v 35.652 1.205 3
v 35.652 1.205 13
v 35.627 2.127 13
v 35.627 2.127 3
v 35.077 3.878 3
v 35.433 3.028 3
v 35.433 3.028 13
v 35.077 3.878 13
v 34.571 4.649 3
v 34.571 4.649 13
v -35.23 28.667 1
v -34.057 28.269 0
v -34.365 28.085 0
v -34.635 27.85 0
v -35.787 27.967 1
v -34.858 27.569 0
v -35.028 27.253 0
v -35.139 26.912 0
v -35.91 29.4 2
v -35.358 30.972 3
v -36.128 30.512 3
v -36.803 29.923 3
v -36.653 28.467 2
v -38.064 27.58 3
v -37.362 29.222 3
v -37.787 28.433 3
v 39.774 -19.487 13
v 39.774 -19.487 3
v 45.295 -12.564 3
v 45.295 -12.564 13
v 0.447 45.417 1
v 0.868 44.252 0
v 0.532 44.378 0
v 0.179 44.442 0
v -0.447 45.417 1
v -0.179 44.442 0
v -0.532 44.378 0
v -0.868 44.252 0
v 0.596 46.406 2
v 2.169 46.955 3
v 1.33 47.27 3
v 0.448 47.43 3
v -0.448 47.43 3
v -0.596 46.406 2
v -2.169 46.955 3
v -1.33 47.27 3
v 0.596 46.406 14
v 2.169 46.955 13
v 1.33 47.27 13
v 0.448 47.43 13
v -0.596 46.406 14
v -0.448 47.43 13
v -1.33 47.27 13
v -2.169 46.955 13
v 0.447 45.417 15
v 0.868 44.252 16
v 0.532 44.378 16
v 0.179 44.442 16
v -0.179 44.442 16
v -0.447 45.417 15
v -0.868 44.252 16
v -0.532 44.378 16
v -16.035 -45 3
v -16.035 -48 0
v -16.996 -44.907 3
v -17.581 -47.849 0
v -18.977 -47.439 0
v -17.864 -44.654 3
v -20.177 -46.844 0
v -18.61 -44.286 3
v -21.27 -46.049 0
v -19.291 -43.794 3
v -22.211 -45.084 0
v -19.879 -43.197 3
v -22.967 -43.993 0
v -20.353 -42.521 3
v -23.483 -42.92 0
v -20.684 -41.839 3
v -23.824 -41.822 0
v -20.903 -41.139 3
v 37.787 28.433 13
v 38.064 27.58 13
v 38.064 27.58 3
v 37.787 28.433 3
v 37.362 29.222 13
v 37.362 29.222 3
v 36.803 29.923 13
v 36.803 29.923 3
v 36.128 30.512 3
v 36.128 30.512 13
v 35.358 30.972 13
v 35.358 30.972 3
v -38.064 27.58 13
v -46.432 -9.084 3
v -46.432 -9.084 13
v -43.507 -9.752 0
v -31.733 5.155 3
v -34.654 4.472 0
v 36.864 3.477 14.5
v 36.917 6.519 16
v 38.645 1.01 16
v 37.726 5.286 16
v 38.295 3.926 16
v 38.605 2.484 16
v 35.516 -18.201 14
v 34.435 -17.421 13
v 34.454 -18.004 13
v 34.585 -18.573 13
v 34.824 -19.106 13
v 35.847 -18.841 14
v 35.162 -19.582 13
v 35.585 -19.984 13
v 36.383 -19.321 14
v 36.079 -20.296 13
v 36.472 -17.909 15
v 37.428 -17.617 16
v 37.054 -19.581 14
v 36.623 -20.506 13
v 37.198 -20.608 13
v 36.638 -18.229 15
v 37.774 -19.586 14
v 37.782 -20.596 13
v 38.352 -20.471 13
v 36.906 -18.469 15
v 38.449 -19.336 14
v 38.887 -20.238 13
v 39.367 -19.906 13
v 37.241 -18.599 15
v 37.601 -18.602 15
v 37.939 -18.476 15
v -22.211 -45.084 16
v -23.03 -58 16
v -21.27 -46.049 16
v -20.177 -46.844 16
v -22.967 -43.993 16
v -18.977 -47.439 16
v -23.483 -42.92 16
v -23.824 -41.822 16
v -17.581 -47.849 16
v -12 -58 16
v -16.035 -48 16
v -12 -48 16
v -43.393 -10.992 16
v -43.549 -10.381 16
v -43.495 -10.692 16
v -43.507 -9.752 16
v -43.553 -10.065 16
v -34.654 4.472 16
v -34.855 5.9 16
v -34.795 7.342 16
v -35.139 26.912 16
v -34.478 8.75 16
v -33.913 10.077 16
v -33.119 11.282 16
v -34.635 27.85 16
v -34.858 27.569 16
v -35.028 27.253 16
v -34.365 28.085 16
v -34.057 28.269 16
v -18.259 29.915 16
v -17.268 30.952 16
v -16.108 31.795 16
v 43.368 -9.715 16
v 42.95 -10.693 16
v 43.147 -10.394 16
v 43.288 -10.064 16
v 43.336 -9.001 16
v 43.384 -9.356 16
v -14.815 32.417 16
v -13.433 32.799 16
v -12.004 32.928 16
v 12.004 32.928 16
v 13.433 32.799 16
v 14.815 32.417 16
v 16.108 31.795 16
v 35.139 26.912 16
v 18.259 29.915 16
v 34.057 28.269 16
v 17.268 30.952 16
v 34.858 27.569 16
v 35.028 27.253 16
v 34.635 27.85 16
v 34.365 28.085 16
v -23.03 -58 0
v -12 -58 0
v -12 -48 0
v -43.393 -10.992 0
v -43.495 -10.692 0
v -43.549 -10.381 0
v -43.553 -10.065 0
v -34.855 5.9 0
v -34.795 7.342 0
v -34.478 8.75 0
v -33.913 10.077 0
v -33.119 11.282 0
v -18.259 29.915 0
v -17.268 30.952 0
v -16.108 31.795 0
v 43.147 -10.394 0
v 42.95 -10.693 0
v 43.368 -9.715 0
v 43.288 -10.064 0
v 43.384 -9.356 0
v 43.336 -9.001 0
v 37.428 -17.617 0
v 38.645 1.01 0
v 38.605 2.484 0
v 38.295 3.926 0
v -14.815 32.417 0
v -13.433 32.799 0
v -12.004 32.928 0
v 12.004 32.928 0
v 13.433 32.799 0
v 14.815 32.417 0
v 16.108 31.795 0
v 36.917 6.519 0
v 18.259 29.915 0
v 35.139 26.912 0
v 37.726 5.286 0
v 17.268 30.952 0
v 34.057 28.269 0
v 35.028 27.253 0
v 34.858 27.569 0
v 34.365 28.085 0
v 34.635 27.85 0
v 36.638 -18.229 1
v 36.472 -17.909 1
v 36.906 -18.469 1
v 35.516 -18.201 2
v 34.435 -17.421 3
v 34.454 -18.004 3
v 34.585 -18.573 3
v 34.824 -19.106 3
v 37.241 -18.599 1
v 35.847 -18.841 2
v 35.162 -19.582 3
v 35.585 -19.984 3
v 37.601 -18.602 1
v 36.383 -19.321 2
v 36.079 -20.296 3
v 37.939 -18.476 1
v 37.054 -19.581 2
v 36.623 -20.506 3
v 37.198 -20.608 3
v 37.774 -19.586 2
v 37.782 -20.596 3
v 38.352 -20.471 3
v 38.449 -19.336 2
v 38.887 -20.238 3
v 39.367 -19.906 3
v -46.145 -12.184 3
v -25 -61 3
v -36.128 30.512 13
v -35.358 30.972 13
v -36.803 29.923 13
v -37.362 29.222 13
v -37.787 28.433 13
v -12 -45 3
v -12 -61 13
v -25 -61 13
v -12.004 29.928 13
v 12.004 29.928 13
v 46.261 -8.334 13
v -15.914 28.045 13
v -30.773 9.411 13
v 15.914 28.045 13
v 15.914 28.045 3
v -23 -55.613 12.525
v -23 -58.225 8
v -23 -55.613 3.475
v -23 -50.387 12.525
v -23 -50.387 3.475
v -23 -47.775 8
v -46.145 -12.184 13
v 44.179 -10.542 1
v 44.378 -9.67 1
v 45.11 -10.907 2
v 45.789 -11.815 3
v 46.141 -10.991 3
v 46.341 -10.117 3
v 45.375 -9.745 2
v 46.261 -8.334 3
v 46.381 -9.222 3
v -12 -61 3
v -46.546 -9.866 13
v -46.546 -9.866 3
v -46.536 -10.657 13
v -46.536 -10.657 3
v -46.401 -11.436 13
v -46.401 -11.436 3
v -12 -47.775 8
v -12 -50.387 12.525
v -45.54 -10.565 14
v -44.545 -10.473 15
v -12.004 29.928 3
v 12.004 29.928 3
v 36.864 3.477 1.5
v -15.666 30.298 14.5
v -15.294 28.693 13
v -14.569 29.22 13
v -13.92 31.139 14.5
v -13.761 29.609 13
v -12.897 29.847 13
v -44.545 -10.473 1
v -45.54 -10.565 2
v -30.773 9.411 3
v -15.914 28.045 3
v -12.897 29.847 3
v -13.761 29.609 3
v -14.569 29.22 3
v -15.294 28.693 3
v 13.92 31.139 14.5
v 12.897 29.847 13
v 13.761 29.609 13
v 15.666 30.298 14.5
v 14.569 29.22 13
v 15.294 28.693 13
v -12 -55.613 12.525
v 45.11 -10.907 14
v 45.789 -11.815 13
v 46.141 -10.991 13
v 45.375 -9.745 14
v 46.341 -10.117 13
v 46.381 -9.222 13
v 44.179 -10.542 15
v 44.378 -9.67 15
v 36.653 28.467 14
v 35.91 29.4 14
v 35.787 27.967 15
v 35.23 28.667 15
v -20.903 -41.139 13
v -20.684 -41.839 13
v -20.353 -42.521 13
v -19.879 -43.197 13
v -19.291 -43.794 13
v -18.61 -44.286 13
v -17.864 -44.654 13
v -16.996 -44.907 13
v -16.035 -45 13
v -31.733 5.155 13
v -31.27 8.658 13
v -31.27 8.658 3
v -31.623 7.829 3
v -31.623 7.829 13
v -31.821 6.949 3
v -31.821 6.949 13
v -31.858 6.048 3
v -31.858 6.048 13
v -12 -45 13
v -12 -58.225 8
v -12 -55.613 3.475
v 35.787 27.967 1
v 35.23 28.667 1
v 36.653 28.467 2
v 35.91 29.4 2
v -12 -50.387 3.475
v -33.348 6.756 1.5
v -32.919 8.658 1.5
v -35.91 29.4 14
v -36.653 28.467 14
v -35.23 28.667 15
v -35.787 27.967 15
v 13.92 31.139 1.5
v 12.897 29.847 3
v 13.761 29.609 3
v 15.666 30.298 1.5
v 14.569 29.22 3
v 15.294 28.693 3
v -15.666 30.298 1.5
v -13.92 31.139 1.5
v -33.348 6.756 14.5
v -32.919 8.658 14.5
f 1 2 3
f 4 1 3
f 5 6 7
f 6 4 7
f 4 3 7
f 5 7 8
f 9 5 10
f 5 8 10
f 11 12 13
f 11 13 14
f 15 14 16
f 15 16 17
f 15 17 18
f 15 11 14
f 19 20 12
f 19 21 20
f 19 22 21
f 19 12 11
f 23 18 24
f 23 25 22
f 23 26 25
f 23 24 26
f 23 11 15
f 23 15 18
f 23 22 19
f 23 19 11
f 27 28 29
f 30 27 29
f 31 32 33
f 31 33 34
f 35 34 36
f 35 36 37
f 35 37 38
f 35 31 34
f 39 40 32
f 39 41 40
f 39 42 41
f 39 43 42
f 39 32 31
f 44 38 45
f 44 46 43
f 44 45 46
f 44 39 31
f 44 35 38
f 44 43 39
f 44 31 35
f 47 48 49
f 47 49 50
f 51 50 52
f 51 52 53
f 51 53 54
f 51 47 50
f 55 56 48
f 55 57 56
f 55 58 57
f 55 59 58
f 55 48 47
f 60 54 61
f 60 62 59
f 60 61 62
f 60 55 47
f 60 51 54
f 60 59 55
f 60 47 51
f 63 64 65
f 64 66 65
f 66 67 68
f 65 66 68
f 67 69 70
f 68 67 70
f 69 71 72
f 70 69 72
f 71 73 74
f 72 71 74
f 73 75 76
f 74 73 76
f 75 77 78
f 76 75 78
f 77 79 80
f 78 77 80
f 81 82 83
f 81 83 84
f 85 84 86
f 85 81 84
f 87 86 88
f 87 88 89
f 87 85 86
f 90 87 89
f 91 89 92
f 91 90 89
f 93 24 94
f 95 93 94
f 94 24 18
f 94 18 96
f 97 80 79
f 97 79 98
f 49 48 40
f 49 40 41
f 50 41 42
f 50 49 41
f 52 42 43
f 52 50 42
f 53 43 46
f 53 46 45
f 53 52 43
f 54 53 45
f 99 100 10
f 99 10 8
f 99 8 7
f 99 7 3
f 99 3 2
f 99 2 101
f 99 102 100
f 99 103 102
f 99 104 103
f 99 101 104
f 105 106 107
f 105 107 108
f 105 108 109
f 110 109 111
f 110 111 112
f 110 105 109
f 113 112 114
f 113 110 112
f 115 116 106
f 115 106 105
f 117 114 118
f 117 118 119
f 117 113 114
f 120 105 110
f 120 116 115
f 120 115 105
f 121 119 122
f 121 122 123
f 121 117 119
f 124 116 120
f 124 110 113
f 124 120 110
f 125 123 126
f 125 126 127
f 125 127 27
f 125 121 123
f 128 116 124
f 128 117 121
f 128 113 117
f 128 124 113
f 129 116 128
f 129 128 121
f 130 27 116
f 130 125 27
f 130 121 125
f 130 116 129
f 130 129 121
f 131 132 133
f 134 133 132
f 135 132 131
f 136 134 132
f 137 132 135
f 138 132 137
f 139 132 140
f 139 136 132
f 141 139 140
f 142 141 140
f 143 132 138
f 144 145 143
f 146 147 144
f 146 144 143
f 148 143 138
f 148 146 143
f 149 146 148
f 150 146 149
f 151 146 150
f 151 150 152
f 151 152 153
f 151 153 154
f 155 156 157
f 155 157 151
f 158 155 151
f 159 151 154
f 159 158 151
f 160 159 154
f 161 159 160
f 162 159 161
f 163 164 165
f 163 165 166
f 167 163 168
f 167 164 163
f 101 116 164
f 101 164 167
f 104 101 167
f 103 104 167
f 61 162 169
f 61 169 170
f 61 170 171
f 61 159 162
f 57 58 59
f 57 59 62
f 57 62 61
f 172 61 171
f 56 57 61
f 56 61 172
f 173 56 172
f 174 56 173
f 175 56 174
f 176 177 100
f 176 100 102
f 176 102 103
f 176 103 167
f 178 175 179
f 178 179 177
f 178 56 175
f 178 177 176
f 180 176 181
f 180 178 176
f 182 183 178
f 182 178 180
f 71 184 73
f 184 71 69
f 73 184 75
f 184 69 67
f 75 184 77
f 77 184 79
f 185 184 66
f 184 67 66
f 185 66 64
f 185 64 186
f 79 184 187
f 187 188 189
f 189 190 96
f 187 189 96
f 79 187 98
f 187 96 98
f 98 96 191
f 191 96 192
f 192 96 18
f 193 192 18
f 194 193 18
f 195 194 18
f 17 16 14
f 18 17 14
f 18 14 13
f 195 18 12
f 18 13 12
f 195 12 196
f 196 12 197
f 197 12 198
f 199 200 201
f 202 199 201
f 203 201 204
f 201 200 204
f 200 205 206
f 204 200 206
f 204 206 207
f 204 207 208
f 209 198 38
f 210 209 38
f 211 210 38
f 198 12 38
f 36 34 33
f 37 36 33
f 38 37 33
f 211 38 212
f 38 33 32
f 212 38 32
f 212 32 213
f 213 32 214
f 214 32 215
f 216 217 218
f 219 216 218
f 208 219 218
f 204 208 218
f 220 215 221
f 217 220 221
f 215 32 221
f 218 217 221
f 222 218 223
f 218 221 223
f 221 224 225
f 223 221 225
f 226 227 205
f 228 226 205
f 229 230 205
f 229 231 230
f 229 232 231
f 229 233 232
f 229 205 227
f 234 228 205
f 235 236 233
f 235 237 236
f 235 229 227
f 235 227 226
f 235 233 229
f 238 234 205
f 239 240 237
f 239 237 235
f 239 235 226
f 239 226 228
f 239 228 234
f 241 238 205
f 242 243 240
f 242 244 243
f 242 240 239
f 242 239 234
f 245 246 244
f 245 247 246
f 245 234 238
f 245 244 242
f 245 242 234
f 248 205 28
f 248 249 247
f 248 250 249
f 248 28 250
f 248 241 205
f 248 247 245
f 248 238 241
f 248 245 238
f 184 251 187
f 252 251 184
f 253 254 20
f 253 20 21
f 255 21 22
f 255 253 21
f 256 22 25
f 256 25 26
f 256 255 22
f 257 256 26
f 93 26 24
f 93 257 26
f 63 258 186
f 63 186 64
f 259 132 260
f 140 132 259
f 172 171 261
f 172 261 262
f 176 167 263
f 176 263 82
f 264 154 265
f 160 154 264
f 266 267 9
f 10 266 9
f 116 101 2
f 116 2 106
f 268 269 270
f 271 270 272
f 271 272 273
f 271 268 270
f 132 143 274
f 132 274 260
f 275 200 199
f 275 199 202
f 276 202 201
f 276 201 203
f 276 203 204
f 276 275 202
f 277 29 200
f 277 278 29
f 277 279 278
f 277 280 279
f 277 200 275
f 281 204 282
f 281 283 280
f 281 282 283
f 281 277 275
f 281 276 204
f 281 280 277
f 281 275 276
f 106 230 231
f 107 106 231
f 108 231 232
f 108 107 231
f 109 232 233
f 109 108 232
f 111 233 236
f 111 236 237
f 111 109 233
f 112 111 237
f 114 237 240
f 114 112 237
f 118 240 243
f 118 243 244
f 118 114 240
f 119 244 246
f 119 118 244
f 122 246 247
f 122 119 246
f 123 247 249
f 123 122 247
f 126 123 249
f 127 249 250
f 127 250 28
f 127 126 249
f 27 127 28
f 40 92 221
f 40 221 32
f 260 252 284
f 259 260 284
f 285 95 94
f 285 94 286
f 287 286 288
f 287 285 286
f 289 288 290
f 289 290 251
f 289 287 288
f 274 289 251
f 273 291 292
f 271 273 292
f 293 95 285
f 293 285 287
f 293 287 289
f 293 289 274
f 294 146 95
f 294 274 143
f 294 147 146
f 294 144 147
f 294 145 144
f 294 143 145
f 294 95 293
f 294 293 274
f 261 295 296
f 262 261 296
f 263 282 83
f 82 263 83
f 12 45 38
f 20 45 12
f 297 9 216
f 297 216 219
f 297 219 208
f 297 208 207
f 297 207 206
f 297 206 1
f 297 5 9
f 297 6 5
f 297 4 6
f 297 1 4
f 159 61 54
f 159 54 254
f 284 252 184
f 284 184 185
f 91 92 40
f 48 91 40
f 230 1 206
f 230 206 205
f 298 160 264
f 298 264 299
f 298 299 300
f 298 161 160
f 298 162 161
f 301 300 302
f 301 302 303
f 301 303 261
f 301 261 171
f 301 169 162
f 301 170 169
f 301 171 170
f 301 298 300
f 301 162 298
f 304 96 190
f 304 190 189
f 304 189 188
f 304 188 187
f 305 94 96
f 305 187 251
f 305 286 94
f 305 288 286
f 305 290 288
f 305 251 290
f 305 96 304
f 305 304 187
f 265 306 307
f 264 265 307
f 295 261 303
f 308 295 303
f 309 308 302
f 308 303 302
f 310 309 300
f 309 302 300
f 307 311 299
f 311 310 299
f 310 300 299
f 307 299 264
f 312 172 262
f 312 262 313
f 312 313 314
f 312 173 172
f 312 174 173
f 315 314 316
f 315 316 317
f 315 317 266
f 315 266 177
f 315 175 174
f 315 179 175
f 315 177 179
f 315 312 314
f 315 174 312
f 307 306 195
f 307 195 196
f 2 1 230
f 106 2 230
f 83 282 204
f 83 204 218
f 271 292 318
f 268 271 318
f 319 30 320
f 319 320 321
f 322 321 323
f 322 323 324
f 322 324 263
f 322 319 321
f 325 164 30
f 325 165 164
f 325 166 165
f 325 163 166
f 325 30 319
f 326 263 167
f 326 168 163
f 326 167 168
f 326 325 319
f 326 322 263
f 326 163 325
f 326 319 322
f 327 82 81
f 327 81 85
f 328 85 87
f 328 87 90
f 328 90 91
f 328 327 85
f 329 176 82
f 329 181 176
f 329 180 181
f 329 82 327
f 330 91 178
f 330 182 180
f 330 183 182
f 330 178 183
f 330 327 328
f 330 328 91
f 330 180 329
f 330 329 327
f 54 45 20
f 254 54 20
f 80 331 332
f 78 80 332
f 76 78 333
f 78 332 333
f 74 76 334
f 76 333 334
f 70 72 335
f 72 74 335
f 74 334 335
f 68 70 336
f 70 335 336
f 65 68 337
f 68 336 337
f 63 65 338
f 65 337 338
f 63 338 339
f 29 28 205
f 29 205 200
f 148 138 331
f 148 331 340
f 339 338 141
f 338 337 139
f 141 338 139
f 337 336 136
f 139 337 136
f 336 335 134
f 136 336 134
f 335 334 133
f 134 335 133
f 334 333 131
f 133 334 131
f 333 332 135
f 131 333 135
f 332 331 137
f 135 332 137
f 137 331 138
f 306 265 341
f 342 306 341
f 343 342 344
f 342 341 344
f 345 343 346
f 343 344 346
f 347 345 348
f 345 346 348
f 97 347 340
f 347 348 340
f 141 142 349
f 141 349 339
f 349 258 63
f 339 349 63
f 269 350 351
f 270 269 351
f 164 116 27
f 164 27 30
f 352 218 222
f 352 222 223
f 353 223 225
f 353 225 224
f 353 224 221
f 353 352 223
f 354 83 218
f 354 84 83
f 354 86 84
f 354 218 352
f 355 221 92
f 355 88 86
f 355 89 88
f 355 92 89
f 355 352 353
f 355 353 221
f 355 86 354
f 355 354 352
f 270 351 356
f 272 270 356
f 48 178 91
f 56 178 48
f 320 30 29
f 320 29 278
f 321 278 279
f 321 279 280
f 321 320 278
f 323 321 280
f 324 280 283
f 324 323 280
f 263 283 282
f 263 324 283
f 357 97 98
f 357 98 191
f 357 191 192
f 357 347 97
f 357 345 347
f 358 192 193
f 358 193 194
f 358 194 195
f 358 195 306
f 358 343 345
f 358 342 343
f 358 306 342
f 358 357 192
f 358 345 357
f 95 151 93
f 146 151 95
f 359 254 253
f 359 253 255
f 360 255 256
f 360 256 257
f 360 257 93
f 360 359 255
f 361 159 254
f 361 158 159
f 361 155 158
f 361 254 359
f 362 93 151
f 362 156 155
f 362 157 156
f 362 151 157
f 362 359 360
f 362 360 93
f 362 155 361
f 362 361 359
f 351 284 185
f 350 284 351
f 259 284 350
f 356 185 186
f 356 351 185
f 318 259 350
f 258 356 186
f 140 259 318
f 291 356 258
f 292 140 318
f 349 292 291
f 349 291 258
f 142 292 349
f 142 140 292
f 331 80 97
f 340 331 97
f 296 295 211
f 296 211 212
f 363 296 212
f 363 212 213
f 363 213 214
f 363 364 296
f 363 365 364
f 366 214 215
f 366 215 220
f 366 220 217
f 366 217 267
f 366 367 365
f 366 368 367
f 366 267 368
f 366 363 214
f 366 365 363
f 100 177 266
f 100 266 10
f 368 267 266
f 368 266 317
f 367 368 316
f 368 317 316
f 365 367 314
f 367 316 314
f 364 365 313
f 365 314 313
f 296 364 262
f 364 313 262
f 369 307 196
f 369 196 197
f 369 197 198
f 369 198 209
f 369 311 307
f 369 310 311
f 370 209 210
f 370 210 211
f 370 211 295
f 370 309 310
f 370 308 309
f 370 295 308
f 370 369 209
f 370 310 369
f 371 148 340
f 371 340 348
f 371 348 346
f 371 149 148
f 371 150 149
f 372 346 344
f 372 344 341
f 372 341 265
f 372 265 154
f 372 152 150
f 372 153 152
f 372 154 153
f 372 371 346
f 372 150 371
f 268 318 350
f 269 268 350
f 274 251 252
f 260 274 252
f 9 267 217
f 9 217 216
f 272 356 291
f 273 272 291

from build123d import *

# Parameters (mm, degrees)
F1_DEPTH = 16
F2_R     = 3
F3_R     = 5
F4_R     = 5
F5_W     = 16
F5_H     = 16
F6_DEPTH = 12
F7_DEPTH = 23
F8_SIZE  = 3


with BuildPart() as f1:
    # F0 (on Top) → F1 (new body)
    with BuildSketch(Plane.XY):
        Polygon((0, -61), (0, -45), (-20, -45), (-20.4101977074, -43.2465056593), (-20.8264194776, -43.2465056593), (-46.7965397847, -10.6810048299), (-25, -61), align=None)
        Polygon((-20.8264194776, -43.2465056593), (-20.4101977074, -43.2465056593), (-32.2850969664, 7.5157689065), (-46.7965397847, -10.6810048299), align=None)
        Polygon((-46.7965397847, -10.6810048299), (-32.2850969664, 7.5157689065), (-37.5279111585, 29.9275104892), align=None)
        Polygon((-37.5279111585, 29.9275104892), (-32.2850969664, 7.5157689065), (-14.4123294557, 29.9275104892), align=None)
        Polygon((0, 48), (-37.5279111585, 29.9275104892), (-14.4123294557, 29.9275104892), align=None)
        Polygon((0, 48), (-14.4123294557, 29.9275104892), (14.4123294557, 29.9275104892), align=None)
        Polygon((37.5279111585, 29.9275104892), (0, 48), (14.4123294557, 29.9275104892), align=None)
        Polygon((14.4123294557, 29.9275104892), (35.7777584033, 3.1361099918), (37.5279111585, 29.9275104892), align=None)
        Polygon((35.7777584033, 3.1361099918), (46.7965397847, -10.6810048299), (37.5279111585, 29.9275104892), align=None)
        Polygon((35.7777584033, 3.1361099918), (33.8114796312, -26.9637552446), (46.7965397847, -10.6810048299), align=None)
    extrude(amount=F1_DEPTH)

    # F2
    f2_edges = [f1.edges().sort_by_distance(p)[0] for p in [
        (33.81148, -26.963755, 8),
    ]]
    fillet(f2_edges, radius=F2_R)

    # F3
    f3_edges = [f1.edges().sort_by_distance(p)[0] for p in [
        (-46.79654, -10.681005, 8),
        (-37.527911, 29.92751, 8),
        (0, 48, 8),
        (37.527911, 29.92751, 8),
        (46.79654, -10.681005, 8),
    ]]
    fillet(f3_edges, radius=F3_R)

    # F4
    f4_edges = [f1.edges().sort_by_distance(p)[0] for p in [
        (-32.285097, 7.515769, 8),
        (-14.412329, 29.92751, 8),
        (14.412329, 29.92751, 8),
        (35.777758, 3.13611, 8),
        (-20, -45, 8),
    ]]
    fillet(f4_edges, radius=F4_R)

    # F5 (on face) → F6 (cut)
    with BuildSketch(Plane.YZ):
        with Locations((-53, 8)):
            Rectangle(F5_W, F5_H)
        Polygon((-50.3874900319, 3.475), (-55.6125099681, 3.475), (-58.2250199362, 8), (-55.6125099681, 12.525), (-50.3874900319, 12.525), (-47.7749800638, 8), align=None, mode=Mode.SUBTRACT)
        Polygon((-58.2250199362, 8), (-55.6125099681, 3.475), (-50.3874900319, 3.475), (-47.7749800638, 8), (-50.3874900319, 12.525), (-55.6125099681, 12.525), align=None)
    extrude(amount=-F6_DEPTH, mode=Mode.SUBTRACT)

    # F5 (on face) → F7 (cut)
    with BuildSketch(Plane.YZ):
        Polygon((-58.2250199362, 8), (-55.6125099681, 3.475), (-50.3874900319, 3.475), (-47.7749800638, 8), (-50.3874900319, 12.525), (-55.6125099681, 12.525), align=None)
    extrude(amount=-F7_DEPTH, mode=Mode.SUBTRACT)

    # F8
    f8_edges = [f1.edges().sort_by_distance(p)[0] for p in [
        (-26.318032, -17.991965, 16),
        (-18.5, -61, 16),
        (-18.5, -61, 0),
        (-26.318032, -17.991965, 0),
    ]]
    chamfer(f8_edges, length=F8_SIZE)


solid = f1.part
